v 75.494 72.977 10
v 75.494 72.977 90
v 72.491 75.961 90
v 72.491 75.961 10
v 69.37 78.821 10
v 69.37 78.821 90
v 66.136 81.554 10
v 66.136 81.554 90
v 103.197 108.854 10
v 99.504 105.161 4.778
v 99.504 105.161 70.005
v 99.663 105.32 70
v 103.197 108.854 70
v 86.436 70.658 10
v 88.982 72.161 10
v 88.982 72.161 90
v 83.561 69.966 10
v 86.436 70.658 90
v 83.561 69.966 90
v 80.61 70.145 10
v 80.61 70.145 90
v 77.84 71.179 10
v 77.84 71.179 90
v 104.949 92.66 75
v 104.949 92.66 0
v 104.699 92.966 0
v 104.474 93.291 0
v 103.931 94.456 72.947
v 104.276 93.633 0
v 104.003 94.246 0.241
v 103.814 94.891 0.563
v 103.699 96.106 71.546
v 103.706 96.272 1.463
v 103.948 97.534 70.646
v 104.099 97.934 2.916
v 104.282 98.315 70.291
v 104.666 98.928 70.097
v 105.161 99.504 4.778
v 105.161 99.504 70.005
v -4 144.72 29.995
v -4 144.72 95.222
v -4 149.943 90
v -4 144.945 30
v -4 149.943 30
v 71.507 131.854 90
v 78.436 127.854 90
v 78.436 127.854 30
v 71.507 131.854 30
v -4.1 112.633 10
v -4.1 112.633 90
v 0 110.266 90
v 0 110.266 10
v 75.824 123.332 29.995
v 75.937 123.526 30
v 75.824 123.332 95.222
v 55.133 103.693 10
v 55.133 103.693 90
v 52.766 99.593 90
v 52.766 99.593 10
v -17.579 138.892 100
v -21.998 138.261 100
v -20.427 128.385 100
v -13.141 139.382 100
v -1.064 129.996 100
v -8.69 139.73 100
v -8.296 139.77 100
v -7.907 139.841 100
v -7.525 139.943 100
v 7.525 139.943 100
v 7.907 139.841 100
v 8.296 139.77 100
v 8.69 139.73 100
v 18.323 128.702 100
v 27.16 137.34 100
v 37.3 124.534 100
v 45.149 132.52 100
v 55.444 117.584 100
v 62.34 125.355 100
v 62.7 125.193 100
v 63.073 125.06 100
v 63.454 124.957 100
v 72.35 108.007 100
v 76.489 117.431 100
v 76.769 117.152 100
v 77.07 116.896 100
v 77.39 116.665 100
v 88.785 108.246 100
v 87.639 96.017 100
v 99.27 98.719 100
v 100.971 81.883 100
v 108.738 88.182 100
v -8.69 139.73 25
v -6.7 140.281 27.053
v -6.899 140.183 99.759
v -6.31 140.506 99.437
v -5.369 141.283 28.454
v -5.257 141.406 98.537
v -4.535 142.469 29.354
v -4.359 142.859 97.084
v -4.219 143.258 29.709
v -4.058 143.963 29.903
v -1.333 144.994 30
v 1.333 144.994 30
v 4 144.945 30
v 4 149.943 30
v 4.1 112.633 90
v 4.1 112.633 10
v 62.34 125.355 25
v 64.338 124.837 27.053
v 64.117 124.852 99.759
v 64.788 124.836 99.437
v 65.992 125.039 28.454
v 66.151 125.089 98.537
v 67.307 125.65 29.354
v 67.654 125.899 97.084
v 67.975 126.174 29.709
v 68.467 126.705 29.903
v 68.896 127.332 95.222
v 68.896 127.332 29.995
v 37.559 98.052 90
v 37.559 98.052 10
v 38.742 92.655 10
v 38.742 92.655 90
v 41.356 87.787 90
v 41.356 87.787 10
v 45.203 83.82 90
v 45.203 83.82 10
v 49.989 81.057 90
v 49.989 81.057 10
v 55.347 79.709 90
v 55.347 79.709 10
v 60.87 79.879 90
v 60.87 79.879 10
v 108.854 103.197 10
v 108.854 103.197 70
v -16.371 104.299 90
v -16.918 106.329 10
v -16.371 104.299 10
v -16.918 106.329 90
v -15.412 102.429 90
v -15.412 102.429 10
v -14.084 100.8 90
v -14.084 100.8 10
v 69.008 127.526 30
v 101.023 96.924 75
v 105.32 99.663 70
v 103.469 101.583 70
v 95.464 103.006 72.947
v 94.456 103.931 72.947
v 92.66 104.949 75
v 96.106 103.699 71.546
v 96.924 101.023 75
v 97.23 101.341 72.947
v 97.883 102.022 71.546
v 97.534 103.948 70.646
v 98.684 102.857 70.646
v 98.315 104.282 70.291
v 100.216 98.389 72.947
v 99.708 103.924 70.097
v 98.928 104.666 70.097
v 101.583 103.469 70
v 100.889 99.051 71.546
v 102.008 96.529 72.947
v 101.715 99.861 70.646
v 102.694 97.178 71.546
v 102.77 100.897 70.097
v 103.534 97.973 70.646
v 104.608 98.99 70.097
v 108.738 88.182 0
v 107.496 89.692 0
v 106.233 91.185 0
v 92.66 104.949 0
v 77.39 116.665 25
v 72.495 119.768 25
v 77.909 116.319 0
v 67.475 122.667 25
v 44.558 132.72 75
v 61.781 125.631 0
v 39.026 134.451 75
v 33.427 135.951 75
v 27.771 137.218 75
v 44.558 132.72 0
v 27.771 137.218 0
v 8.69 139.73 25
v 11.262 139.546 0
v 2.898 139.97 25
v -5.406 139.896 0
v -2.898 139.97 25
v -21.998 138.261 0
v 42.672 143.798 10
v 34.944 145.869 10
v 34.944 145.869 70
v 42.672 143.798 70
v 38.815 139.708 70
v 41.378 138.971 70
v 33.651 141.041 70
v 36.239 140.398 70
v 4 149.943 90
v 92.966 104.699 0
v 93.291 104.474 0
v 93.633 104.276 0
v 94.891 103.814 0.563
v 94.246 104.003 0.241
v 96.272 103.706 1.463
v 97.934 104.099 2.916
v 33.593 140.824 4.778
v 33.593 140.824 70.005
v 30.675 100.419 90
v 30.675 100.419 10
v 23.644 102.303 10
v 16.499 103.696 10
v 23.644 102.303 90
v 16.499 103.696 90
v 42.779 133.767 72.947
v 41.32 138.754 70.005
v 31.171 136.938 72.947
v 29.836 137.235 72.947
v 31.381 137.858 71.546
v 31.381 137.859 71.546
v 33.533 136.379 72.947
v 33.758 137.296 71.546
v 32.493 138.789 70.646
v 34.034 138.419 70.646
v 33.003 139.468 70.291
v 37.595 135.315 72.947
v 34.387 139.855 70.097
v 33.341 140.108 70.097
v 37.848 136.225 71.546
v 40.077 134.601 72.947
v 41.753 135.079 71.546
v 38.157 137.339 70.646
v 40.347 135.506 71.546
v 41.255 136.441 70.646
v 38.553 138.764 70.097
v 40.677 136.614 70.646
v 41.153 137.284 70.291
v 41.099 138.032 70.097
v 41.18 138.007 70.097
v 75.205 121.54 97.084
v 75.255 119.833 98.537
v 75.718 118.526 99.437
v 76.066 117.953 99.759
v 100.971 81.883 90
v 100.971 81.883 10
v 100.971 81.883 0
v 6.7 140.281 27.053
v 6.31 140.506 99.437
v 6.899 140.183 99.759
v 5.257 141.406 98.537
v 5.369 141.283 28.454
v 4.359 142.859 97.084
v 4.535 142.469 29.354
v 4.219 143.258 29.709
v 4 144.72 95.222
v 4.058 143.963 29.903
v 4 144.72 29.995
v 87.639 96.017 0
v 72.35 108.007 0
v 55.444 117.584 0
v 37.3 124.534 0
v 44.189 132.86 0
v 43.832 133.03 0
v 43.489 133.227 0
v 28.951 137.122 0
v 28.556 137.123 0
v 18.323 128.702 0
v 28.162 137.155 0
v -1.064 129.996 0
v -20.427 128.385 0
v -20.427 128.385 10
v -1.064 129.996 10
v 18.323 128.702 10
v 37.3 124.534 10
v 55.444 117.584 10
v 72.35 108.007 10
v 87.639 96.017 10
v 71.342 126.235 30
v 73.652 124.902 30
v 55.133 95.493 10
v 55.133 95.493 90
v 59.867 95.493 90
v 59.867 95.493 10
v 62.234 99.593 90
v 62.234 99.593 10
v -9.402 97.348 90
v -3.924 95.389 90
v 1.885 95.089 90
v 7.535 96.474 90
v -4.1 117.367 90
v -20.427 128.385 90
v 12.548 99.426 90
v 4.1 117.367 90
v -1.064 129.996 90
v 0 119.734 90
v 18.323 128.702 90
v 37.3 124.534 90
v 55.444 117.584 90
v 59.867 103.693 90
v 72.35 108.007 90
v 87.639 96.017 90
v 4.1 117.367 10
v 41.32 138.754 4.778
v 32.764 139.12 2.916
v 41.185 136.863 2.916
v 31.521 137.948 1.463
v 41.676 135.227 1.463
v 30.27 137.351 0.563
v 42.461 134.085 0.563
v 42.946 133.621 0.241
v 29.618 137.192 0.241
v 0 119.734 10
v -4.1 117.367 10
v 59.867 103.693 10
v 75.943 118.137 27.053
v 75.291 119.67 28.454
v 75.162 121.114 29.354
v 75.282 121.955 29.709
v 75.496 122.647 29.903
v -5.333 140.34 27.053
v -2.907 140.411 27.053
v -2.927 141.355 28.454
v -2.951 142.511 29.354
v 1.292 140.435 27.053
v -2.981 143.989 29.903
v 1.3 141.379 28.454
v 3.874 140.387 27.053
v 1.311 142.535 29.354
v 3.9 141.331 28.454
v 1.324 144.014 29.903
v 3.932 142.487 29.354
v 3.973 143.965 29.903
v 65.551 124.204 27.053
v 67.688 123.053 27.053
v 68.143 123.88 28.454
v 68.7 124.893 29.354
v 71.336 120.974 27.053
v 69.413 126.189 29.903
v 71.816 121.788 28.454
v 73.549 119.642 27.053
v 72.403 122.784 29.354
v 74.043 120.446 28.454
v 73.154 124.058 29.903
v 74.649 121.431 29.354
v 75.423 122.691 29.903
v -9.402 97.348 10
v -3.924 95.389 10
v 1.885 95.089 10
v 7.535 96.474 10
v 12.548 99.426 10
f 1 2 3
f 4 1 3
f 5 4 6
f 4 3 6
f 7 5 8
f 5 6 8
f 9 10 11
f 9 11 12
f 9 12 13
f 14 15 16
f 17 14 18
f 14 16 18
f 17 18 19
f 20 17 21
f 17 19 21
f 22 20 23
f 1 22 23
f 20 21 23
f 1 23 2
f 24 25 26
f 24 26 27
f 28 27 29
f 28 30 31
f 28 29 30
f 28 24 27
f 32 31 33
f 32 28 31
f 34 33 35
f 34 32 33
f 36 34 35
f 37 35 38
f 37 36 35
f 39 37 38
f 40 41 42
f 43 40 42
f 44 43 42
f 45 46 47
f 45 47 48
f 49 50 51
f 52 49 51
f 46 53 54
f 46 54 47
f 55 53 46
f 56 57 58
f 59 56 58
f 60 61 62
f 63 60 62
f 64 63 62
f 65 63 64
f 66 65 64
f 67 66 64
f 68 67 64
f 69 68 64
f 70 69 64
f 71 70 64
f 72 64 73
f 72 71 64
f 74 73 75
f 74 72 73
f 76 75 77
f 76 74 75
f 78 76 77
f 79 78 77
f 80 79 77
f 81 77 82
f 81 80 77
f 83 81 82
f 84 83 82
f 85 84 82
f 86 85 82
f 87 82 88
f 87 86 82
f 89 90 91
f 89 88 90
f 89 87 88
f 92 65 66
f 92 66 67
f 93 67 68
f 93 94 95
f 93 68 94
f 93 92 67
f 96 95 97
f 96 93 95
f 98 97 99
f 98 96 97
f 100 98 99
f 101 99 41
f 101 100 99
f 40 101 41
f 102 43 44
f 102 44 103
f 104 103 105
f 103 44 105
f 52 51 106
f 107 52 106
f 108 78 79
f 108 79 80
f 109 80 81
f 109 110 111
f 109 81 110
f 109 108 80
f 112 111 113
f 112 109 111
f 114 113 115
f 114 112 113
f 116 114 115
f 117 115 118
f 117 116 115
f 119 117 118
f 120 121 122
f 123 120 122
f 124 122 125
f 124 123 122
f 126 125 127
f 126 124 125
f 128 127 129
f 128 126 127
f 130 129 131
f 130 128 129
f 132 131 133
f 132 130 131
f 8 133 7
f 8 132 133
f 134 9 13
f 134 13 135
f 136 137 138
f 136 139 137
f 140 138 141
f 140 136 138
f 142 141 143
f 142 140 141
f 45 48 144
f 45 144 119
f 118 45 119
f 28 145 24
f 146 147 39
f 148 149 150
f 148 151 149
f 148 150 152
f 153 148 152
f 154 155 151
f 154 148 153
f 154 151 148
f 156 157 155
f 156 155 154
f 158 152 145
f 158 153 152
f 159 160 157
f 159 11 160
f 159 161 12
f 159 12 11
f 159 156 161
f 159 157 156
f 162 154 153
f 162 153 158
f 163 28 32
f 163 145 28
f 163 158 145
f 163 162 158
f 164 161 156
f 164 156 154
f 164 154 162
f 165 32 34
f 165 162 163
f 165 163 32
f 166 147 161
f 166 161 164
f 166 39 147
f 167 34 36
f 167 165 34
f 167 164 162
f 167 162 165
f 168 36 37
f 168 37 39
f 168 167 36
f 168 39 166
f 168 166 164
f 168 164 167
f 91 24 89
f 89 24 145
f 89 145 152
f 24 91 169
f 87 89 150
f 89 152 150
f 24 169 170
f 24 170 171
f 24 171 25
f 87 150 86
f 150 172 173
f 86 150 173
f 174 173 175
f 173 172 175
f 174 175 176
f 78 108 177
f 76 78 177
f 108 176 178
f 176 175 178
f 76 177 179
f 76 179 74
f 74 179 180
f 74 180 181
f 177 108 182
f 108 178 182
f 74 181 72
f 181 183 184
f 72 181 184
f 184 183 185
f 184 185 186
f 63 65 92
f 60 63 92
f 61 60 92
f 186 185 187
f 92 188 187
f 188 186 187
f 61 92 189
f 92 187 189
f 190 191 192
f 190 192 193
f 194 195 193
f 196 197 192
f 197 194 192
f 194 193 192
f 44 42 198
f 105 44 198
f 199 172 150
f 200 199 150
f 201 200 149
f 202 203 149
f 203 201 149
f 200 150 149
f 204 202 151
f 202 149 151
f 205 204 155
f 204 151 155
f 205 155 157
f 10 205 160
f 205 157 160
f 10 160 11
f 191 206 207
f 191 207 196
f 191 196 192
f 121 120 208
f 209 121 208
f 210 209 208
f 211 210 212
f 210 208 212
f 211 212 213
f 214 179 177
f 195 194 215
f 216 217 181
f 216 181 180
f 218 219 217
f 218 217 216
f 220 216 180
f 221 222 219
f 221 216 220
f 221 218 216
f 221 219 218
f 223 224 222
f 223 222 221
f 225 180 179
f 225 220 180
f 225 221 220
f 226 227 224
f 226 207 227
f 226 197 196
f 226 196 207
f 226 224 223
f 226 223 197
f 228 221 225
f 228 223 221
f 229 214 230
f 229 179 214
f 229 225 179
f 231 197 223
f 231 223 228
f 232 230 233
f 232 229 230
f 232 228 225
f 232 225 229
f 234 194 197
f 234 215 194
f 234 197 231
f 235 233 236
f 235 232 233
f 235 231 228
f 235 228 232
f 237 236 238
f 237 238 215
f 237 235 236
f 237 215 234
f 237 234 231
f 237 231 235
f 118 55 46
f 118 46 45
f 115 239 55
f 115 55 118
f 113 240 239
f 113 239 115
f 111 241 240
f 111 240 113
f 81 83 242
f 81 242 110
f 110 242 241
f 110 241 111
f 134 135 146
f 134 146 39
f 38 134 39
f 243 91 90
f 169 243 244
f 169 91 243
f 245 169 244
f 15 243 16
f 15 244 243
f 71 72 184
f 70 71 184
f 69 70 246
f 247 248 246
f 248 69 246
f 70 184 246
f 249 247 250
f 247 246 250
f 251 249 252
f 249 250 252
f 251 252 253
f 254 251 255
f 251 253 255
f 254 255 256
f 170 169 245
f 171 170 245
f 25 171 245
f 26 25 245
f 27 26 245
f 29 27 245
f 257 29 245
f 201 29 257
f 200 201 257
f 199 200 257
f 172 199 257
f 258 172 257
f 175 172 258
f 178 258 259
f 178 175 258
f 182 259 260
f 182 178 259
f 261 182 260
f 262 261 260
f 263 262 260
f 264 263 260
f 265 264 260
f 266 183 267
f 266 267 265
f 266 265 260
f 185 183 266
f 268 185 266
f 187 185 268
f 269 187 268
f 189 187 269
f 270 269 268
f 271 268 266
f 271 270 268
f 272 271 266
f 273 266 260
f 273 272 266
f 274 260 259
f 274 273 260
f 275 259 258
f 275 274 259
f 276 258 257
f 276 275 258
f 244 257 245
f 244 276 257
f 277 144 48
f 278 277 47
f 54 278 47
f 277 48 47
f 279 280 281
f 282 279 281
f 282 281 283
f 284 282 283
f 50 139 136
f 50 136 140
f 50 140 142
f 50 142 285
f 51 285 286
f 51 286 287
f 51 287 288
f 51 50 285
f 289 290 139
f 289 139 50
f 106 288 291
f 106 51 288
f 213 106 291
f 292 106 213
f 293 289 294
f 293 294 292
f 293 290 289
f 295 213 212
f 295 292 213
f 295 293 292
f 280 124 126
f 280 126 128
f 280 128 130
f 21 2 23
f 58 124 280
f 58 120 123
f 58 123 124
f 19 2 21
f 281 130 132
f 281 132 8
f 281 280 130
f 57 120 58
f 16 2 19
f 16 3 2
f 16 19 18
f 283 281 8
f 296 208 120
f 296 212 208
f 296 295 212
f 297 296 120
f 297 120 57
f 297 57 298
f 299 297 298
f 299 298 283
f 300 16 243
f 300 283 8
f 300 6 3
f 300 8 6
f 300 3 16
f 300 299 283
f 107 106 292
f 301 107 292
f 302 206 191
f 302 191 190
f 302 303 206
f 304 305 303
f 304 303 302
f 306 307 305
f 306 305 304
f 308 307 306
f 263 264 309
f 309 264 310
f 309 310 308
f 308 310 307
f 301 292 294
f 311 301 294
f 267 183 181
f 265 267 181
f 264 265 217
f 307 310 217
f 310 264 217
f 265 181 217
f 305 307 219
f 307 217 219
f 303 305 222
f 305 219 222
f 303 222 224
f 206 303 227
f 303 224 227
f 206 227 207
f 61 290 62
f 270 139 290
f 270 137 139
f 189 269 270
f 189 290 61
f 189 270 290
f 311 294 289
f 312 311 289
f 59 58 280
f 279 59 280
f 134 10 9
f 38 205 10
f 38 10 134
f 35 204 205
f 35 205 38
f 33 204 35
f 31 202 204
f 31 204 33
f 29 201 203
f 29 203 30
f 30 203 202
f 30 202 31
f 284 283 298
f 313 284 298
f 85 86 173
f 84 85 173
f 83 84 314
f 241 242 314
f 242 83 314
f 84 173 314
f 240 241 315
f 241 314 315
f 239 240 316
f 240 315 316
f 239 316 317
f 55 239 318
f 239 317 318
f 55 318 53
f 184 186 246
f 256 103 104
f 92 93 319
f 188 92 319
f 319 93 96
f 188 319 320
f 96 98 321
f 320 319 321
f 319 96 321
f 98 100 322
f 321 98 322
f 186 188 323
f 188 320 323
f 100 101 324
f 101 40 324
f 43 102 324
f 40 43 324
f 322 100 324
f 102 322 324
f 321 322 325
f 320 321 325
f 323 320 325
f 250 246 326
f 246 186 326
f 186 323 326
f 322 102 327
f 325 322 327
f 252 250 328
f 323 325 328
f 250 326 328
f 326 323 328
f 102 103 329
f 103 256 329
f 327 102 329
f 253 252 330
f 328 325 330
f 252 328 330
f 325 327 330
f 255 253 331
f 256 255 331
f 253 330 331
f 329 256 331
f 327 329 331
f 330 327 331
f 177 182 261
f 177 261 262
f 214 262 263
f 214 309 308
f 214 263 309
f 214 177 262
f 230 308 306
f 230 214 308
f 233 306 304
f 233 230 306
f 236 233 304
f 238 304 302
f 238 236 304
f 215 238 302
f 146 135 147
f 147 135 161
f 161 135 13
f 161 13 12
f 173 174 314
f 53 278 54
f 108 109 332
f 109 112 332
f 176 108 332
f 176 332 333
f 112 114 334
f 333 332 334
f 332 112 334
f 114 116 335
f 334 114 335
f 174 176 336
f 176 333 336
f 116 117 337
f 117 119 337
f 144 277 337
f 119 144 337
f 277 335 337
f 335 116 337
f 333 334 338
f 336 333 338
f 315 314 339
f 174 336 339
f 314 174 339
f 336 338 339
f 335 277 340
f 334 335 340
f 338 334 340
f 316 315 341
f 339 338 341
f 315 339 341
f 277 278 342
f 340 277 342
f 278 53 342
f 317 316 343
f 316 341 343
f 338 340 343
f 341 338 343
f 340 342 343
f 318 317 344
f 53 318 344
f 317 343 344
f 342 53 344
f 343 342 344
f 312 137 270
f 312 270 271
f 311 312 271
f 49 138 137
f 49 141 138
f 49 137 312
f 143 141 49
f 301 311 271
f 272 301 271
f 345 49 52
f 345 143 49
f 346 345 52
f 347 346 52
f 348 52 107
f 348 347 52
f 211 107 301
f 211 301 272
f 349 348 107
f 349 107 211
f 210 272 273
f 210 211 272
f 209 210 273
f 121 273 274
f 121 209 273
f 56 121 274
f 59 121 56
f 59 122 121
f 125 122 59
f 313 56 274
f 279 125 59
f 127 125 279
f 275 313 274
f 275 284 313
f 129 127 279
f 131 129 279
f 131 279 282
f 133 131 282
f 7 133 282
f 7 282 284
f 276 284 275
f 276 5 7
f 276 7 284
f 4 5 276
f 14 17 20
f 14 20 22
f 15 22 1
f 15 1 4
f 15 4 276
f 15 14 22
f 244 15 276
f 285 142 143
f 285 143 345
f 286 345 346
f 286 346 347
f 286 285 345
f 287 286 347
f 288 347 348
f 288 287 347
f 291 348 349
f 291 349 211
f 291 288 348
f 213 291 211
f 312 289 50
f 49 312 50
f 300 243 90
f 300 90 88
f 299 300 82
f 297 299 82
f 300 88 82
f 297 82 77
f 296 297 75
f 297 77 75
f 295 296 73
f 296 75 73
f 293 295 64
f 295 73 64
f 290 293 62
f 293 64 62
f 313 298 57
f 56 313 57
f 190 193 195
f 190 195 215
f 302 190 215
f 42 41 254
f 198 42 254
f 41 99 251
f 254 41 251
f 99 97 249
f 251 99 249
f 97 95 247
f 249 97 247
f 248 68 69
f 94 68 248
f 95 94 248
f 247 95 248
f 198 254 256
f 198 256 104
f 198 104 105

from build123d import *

# Parameters (mm, degrees)
SKETCH_1_R          = 140
EXTRUDE_1_DEPTH     = 100
SKETCH_2_R          = 105
CUT_EXTRUDE_1_DEPTH = 100
SKETCH_3_R          = 20
EXTRUDE_2_DEPTH     = 100
SKETCH_4_R          = 130
CUT_EXTRUDE_2_DEPTH = 10
CUT_EXTRUDE_START   = -10
SKETCH_5_R          = 130
CUT_EXTRUDE_3_DEPTH = 10
CUT_EXTRUDE_4_DEPTH = 218.485631709
SKETCH_7_W          = 8
SKETCH_7_H          = 10
SKETCH_7_W_2        = 10
SKETCH_7_H_2        = 8
EXTRUDE_3_DEPTH     = 70
EXTRUDE_4_DEPTH     = 70
FILLET_3_R          = 5
CHAMFER_1_SIZE      = 10
CUT_EXTRUDE_6_DEPTH = 235.447678383
FILLET_4_R          = 10


with BuildPart() as part:
    # 草图1 → 凸台-拉伸1 (new body)
    with BuildSketch(Plane.XY):
        Circle(SKETCH_1_R)
    extrude(amount=EXTRUDE_1_DEPTH)

    # 草图2 → 切除-拉伸1 (cut)
    with BuildSketch(Plane.XY.offset(100)):
        Circle(SKETCH_2_R)
    extrude(amount=-CUT_EXTRUDE_1_DEPTH, mode=Mode.SUBTRACT)

    # 草图3 → 凸台-拉伸2 (add, through all)
    with BuildSketch(Plane.XY.offset(100)):
        with Locations((0, 115)):
            Circle(SKETCH_3_R)
        with Locations((57.5, 99.592921435)):
            Circle(SKETCH_3_R)
        with Locations((99.592921435, 57.5)):
            Circle(SKETCH_3_R)
        with Locations((115, 0)):
            Circle(SKETCH_3_R)
        with Locations((99.592921435, -57.5)):
            Circle(SKETCH_3_R)
        with Locations((57.5, -99.592921435)):
            Circle(SKETCH_3_R)
        with Locations((0, -115)):
            Circle(SKETCH_3_R)
        with Locations((-57.5, -99.592921435)):
            Circle(SKETCH_3_R)
        with Locations((-99.592921435, -57.5)):
            Circle(SKETCH_3_R)
        with Locations((-115, 0)):
            Circle(SKETCH_3_R)
        with Locations((-99.592921435, 57.5)):
            Circle(SKETCH_3_R)
        with Locations((-57.5, 99.592921435)):
            Circle(SKETCH_3_R)
    extrude(amount=-EXTRUDE_2_DEPTH)

    # 草图4 → 切除-拉伸2 (cut)
    with BuildSketch(Plane.XY.offset(100)):
        Circle(SKETCH_4_R)
    extrude(amount=-CUT_EXTRUDE_2_DEPTH, mode=Mode.SUBTRACT)

    # 草图5 → 切除-拉伸3 (cut)
    with BuildSketch(Plane(origin=(0, 0, 0), x_dir=(-1, 0, 0), z_dir=(0, 0, -1)).offset(CUT_EXTRUDE_START)):
        with Locations(Location((0, 0, 0), (0, 0, 180))):
            Circle(SKETCH_5_R)
    extrude(amount=CUT_EXTRUDE_3_DEPTH, mode=Mode.SUBTRACT)

    # 草图6 → 切除-拉伸4 (cut, through all)
    with BuildSketch(Plane.XY.offset(90)):
        Polygon((55.132863896, 95.492921435), (59.867136104, 95.492921435), (62.234272207, 99.592921435), (59.867136104, 103.692921435), (55.132863896, 103.692921435), (52.765727793, 99.592921435), align=None)
        Polygon((0, 110.265727793), (4.1, 112.632863896), (4.1, 117.367136104), (0, 119.734272207), (-4.1, 117.367136104), (-4.1, 112.632863896), align=None)
        Polygon((95.492921435, 55.132863896), (99.592921435, 52.765727793), (103.692921435, 55.132863896), (103.692921435, 59.867136104), (99.592921435, 62.234272207), (95.492921435, 59.867136104), align=None)
        Polygon((110.265727793, 0), (112.632863896, -4.1), (117.367136104, -4.1), (119.734272207, 0), (117.367136104, 4.1), (112.632863896, 4.1), align=None)
        Polygon((95.492921435, -55.132863896), (95.492921435, -59.867136104), (99.592921435, -62.234272207), (103.692921435, -59.867136104), (103.692921435, -55.132863896), (99.592921435, -52.765727793), align=None)
        Polygon((55.132863896, -95.492921435), (52.765727793, -99.592921435), (55.132863896, -103.692921435), (59.867136104, -103.692921435), (62.234272207, -99.592921435), (59.867136104, -95.492921435), align=None)
        Polygon((0, -110.265727793), (-4.1, -112.632863896), (-4.1, -117.367136104), (0, -119.734272207), (4.1, -117.367136104), (4.1, -112.632863896), align=None)
        Polygon((-55.132863896, -95.492921435), (-59.867136104, -95.492921435), (-62.234272207, -99.592921435), (-59.867136104, -103.692921435), (-55.132863896, -103.692921435), (-52.765727793, -99.592921435), align=None)
        Polygon((-95.492921435, -55.132863896), (-99.592921435, -52.765727793), (-103.692921435, -55.132863896), (-103.692921435, -59.867136104), (-99.592921435, -62.234272207), (-95.492921435, -59.867136104), align=None)
        Polygon((-110.265727793, 0), (-112.632863896, 4.1), (-117.367136104, 4.1), (-119.734272207, 0), (-117.367136104, -4.1), (-112.632863896, -4.1), align=None)
        Polygon((-95.492921435, 55.132863896), (-95.492921435, 59.867136104), (-99.592921435, 62.234272207), (-103.692921435, 59.867136104), (-103.692921435, 55.132863896), (-99.592921435, 52.765727793), align=None)
        Polygon((-55.132863896, 95.492921435), (-52.765727793, 99.592921435), (-55.132863896, 103.692921435), (-59.867136104, 103.692921435), (-62.234272207, 99.592921435), (-59.867136104, 95.492921435), align=None)
    extrude(amount=-CUT_EXTRUDE_4_DEPTH, mode=Mode.SUBTRACT)

    # 草图7 → 凸台-拉伸3 (add)
    with BuildSketch(Plane.XY.offset(100)):
        Polygon((66.507321123, 123.19405926), (73.435524353, 119.19405926), (78.435524353, 127.854313298), (71.507321123, 131.854313298), align=None)
        with Locations((0, 144.942845476)):
            Rectangle(SKETCH_7_W, SKETCH_7_H)
        Polygon((119.19405926, 73.435524353), (123.19405926, 66.507321123), (131.854313298, 71.507321123), (127.854313298, 78.435524353), align=None)
        with Locations((144.942845476, 0)):
            Rectangle(SKETCH_7_W_2, SKETCH_7_H_2)
        Polygon((123.19405926, -66.507321123), (119.19405926, -73.435524353), (127.854313298, -78.435524353), (131.854313298, -71.507321123), align=None)
        Polygon((73.435524353, -119.19405926), (66.507321123, -123.19405926), (71.507321123, -131.854313298), (78.435524353, -127.854313298), align=None)
        with Locations((0, -144.942845476)):
            Rectangle(SKETCH_7_W, SKETCH_7_H)
        Polygon((-66.507321123, -123.19405926), (-73.435524353, -119.19405926), (-78.435524353, -127.854313298), (-71.507321123, -131.854313298), align=None)
        Polygon((-119.19405926, -73.435524353), (-123.19405926, -66.507321123), (-131.854313298, -71.507321123), (-127.854313298, -78.435524353), align=None)
        with Locations((-144.942845476, 0)):
            Rectangle(SKETCH_7_W_2, SKETCH_7_H_2)
        Polygon((-123.19405926, 66.507321123), (-119.19405926, 73.435524353), (-127.854313298, 78.435524353), (-131.854313298, 71.507321123), align=None)
        Polygon((-73.435524353, 119.19405926), (-66.507321123, 123.19405926), (-71.507321123, 131.854313298), (-78.435524353, 127.854313298), align=None)
    extrude(amount=-EXTRUDE_3_DEPTH)

    # 草图9 → 凸台-拉伸4 (add)
    with BuildSketch(Plane(origin=(0, 0, 0), x_dir=(-1, 0, 0), z_dir=(0, 0, -1))):
        Polygon((34.944360781, 145.868943093), (32.35617033, 136.20968483), (40.08357694, 134.13913247), (42.671767391, 143.798390732), align=None)
        Polygon((101.78296214, 96.12610789), (108.854029951, 103.197175702), (103.197175702, 108.854029951), (96.12610789, 101.78296214), align=None)
        Polygon((136.20968483, 32.35617033), (145.868943093, 34.944360781), (143.798390732, 42.671767391), (134.13913247, 40.08357694), align=None)
        Polygon((134.13913247, -40.08357694), (143.798390732, -42.671767391), (145.868943093, -34.944360781), (136.20968483, -32.35617033), align=None)
        Polygon((96.12610789, -101.78296214), (103.197175702, -108.854029951), (108.854029951, -103.197175702), (101.78296214, -96.12610789), align=None)
        Polygon((32.35617033, -136.20968483), (34.944360781, -145.868943093), (42.671767391, -143.798390732), (40.08357694, -134.13913247), align=None)
        Polygon((-40.08357694, -134.13913247), (-42.671767391, -143.798390732), (-34.944360781, -145.868943093), (-32.35617033, -136.20968483), align=None)
        Polygon((-101.78296214, -96.12610789), (-108.854029951, -103.197175702), (-103.197175702, -108.854029951), (-96.12610789, -101.78296214), align=None)
        Polygon((-136.20968483, -32.35617033), (-145.868943093, -34.944360781), (-143.798390732, -42.671767391), (-134.13913247, -40.08357694), align=None)
        Polygon((-134.13913247, 40.08357694), (-143.798390732, 42.671767391), (-145.868943093, 34.944360781), (-136.20968483, 32.35617033), align=None)
        Polygon((-96.12610789, 101.78296214), (-103.197175702, 108.854029951), (-108.854029951, 103.197175702), (-101.78296214, 96.12610789), align=None)
        Polygon((-32.35617033, 136.20968483), (-34.944360781, 145.868943093), (-42.671767391, 143.798390732), (-40.08357694, 134.13913247), align=None)
    extrude(amount=-EXTRUDE_4_DEPTH)

    # 圆角3
    fillet_3_edges = [part.edges().sort_by_distance(p)[0] for p in [
        (70, 121.24355653, 30),
        (-70, 121.24355653, 30),
        (-121.24355653, 70, 30),
        (-140, 0, 30),
        (0, 140, 30),
        (121.24355653, 70, 30),
        (139.98571064, 2.000204155, 30),
        (121.24355653, -70, 30),
        (70, -121.24355653, 30),
        (0, -140, 30),
        (-70, -121.24355653, 30),
        (-121.24355653, -70, 30),
        (-119.19405926, -73.435524353, 65),
        (-123.19405926, -66.507321123, 65),
        (-66.507321123, -123.19405926, 65),
        (-73.435524353, -119.19405926, 65),
        (4, -139.942845476, 65),
        (-4, -139.942845476, 65),
        (73.435524353, -119.19405926, 65),
        (66.507321123, -123.19405926, 65),
        (123.19405926, -66.507321123, 65),
        (119.19405926, -73.435524353, 65),
        (139.942845476, 4, 65),
        (139.942845476, -4, 65),
        (119.19405926, 73.435524353, 65),
        (123.19405926, 66.507321123, 65),
        (-4, 139.942845476, 65),
        (4, 139.942845476, 65),
        (-139.942845476, -4, 65),
        (-139.942845476, 4, 65),
        (-123.19405926, 66.507321123, 65),
        (-119.19405926, 73.435524353, 65),
        (-73.435524353, 119.19405926, 65),
        (-66.507321123, 123.19405926, 65),
        (66.507321123, 123.19405926, 65),
        (73.435524353, 119.19405926, 65),
        (-36.234666314, 135.22961568, 70),
        (36.234666314, 135.22961568, 70),
        (98.994949366, 98.994949366, 70),
        (135.22961568, 36.234666314, 70),
        (135.22961568, -36.234666314, 70),
        (98.994949366, -98.994949366, 70),
        (36.234666314, -135.22961568, 70),
        (-36.234666314, -135.22961568, 70),
        (-98.994949366, -98.994949366, 70),
        (-135.22961568, -36.234666314, 70),
        (-135.22961568, 36.234666314, 70),
        (-98.994949366, 98.994949366, 70),
        (-96.12610789, 101.78296214, 35),
        (-101.78296214, 96.12610789, 35),
        (-134.13913247, 40.08357694, 35),
        (-136.20968483, 32.35617033, 35),
        (-136.20968483, -32.35617033, 35),
        (-134.13913247, -40.08357694, 35),
        (-101.78296214, -96.12610789, 35),
        (-96.12610789, -101.78296214, 35),
        (-40.08357694, -134.13913247, 35),
        (-32.35617033, -136.20968483, 35),
        (32.35617033, -136.20968483, 35),
        (40.08357694, -134.13913247, 35),
        (96.12610789, -101.78296214, 35),
        (101.78296214, -96.12610789, 35),
        (134.13913247, -40.08357694, 35),
        (136.20968483, -32.35617033, 35),
        (136.20968483, 32.35617033, 35),
        (134.13913247, 40.08357694, 35),
        (101.78296214, 96.12610789, 35),
        (96.12610789, 101.78296214, 35),
        (40.08357694, 134.13913247, 35),
        (32.35617033, 136.20968483, 35),
        (-40.08357694, 134.13913247, 35),
        (-32.35617033, 136.20968483, 35),
    ]]
    fillet(fillet_3_edges, radius=FILLET_3_R)

    # 倒角1
    chamfer_1_edges = [part.edges().sort_by_distance(p)[0] for p in [
        (74.971422738, 129.854313298, 100),
        (106.025602827, 106.025602827, 0),
        (129.854313298, 74.971422738, 100),
        (144.833666913, 38.808064086, 0),
        (149.942845476, 0, 100),
        (144.833666913, -38.808064086, 0),
        (129.854313298, -74.971422738, 100),
        (106.025602827, -106.025602827, 0),
        (74.971422738, -129.854313298, 100),
        (38.808064086, -144.833666913, 0),
        (0, -149.942845476, 100),
        (-38.808064086, -144.833666913, 0),
        (-74.971422738, -129.854313298, 100),
        (-106.025602827, -106.025602827, 0),
        (-129.854313298, -74.971422738, 100),
        (-144.833666913, -38.808064086, 0),
        (-149.942845476, 0, 100),
        (-129.854313298, 74.971422738, 100),
        (-74.971422738, 129.854313298, 100),
        (0, 149.942845476, 100),
        (-144.833666913, 38.808064086, 0),
        (-106.025602827, 106.025602827, 0),
        (-38.808064086, 144.833666913, 0),
        (38.808064086, 144.833666913, 0),
    ]]
    chamfer(chamfer_1_edges, length=CHAMFER_1_SIZE)

    # 草图10 → 切除-拉伸6 (cut, through all)
    with BuildSketch(Plane(origin=(0, 0, 0), x_dir=(-1, 0, 0), z_dir=(0, 0, -1))):
        with BuildLine():
            Line((0, 0), (25.926748518, 162.950310559))
            ThreePointArc((25.926748518, 162.950310559), (59.021932425, -154.082482758), (-128.15573424, 103.928378134))
            Line((-128.15573424, 103.928378134), (0, 0))
        make_face()
    extrude(amount=-CUT_EXTRUDE_6_DEPTH, mode=Mode.SUBTRACT)

    # 圆角4
    fillet_4_edges = [part.edges().sort_by_distance(p)[0] for p in [
        (81.553649062, 66.136240631, 50),
        (-16.498839966, 103.695652174, 50),
    ]]
    fillet(fillet_4_edges, radius=FILLET_4_R)


solid = part.part
